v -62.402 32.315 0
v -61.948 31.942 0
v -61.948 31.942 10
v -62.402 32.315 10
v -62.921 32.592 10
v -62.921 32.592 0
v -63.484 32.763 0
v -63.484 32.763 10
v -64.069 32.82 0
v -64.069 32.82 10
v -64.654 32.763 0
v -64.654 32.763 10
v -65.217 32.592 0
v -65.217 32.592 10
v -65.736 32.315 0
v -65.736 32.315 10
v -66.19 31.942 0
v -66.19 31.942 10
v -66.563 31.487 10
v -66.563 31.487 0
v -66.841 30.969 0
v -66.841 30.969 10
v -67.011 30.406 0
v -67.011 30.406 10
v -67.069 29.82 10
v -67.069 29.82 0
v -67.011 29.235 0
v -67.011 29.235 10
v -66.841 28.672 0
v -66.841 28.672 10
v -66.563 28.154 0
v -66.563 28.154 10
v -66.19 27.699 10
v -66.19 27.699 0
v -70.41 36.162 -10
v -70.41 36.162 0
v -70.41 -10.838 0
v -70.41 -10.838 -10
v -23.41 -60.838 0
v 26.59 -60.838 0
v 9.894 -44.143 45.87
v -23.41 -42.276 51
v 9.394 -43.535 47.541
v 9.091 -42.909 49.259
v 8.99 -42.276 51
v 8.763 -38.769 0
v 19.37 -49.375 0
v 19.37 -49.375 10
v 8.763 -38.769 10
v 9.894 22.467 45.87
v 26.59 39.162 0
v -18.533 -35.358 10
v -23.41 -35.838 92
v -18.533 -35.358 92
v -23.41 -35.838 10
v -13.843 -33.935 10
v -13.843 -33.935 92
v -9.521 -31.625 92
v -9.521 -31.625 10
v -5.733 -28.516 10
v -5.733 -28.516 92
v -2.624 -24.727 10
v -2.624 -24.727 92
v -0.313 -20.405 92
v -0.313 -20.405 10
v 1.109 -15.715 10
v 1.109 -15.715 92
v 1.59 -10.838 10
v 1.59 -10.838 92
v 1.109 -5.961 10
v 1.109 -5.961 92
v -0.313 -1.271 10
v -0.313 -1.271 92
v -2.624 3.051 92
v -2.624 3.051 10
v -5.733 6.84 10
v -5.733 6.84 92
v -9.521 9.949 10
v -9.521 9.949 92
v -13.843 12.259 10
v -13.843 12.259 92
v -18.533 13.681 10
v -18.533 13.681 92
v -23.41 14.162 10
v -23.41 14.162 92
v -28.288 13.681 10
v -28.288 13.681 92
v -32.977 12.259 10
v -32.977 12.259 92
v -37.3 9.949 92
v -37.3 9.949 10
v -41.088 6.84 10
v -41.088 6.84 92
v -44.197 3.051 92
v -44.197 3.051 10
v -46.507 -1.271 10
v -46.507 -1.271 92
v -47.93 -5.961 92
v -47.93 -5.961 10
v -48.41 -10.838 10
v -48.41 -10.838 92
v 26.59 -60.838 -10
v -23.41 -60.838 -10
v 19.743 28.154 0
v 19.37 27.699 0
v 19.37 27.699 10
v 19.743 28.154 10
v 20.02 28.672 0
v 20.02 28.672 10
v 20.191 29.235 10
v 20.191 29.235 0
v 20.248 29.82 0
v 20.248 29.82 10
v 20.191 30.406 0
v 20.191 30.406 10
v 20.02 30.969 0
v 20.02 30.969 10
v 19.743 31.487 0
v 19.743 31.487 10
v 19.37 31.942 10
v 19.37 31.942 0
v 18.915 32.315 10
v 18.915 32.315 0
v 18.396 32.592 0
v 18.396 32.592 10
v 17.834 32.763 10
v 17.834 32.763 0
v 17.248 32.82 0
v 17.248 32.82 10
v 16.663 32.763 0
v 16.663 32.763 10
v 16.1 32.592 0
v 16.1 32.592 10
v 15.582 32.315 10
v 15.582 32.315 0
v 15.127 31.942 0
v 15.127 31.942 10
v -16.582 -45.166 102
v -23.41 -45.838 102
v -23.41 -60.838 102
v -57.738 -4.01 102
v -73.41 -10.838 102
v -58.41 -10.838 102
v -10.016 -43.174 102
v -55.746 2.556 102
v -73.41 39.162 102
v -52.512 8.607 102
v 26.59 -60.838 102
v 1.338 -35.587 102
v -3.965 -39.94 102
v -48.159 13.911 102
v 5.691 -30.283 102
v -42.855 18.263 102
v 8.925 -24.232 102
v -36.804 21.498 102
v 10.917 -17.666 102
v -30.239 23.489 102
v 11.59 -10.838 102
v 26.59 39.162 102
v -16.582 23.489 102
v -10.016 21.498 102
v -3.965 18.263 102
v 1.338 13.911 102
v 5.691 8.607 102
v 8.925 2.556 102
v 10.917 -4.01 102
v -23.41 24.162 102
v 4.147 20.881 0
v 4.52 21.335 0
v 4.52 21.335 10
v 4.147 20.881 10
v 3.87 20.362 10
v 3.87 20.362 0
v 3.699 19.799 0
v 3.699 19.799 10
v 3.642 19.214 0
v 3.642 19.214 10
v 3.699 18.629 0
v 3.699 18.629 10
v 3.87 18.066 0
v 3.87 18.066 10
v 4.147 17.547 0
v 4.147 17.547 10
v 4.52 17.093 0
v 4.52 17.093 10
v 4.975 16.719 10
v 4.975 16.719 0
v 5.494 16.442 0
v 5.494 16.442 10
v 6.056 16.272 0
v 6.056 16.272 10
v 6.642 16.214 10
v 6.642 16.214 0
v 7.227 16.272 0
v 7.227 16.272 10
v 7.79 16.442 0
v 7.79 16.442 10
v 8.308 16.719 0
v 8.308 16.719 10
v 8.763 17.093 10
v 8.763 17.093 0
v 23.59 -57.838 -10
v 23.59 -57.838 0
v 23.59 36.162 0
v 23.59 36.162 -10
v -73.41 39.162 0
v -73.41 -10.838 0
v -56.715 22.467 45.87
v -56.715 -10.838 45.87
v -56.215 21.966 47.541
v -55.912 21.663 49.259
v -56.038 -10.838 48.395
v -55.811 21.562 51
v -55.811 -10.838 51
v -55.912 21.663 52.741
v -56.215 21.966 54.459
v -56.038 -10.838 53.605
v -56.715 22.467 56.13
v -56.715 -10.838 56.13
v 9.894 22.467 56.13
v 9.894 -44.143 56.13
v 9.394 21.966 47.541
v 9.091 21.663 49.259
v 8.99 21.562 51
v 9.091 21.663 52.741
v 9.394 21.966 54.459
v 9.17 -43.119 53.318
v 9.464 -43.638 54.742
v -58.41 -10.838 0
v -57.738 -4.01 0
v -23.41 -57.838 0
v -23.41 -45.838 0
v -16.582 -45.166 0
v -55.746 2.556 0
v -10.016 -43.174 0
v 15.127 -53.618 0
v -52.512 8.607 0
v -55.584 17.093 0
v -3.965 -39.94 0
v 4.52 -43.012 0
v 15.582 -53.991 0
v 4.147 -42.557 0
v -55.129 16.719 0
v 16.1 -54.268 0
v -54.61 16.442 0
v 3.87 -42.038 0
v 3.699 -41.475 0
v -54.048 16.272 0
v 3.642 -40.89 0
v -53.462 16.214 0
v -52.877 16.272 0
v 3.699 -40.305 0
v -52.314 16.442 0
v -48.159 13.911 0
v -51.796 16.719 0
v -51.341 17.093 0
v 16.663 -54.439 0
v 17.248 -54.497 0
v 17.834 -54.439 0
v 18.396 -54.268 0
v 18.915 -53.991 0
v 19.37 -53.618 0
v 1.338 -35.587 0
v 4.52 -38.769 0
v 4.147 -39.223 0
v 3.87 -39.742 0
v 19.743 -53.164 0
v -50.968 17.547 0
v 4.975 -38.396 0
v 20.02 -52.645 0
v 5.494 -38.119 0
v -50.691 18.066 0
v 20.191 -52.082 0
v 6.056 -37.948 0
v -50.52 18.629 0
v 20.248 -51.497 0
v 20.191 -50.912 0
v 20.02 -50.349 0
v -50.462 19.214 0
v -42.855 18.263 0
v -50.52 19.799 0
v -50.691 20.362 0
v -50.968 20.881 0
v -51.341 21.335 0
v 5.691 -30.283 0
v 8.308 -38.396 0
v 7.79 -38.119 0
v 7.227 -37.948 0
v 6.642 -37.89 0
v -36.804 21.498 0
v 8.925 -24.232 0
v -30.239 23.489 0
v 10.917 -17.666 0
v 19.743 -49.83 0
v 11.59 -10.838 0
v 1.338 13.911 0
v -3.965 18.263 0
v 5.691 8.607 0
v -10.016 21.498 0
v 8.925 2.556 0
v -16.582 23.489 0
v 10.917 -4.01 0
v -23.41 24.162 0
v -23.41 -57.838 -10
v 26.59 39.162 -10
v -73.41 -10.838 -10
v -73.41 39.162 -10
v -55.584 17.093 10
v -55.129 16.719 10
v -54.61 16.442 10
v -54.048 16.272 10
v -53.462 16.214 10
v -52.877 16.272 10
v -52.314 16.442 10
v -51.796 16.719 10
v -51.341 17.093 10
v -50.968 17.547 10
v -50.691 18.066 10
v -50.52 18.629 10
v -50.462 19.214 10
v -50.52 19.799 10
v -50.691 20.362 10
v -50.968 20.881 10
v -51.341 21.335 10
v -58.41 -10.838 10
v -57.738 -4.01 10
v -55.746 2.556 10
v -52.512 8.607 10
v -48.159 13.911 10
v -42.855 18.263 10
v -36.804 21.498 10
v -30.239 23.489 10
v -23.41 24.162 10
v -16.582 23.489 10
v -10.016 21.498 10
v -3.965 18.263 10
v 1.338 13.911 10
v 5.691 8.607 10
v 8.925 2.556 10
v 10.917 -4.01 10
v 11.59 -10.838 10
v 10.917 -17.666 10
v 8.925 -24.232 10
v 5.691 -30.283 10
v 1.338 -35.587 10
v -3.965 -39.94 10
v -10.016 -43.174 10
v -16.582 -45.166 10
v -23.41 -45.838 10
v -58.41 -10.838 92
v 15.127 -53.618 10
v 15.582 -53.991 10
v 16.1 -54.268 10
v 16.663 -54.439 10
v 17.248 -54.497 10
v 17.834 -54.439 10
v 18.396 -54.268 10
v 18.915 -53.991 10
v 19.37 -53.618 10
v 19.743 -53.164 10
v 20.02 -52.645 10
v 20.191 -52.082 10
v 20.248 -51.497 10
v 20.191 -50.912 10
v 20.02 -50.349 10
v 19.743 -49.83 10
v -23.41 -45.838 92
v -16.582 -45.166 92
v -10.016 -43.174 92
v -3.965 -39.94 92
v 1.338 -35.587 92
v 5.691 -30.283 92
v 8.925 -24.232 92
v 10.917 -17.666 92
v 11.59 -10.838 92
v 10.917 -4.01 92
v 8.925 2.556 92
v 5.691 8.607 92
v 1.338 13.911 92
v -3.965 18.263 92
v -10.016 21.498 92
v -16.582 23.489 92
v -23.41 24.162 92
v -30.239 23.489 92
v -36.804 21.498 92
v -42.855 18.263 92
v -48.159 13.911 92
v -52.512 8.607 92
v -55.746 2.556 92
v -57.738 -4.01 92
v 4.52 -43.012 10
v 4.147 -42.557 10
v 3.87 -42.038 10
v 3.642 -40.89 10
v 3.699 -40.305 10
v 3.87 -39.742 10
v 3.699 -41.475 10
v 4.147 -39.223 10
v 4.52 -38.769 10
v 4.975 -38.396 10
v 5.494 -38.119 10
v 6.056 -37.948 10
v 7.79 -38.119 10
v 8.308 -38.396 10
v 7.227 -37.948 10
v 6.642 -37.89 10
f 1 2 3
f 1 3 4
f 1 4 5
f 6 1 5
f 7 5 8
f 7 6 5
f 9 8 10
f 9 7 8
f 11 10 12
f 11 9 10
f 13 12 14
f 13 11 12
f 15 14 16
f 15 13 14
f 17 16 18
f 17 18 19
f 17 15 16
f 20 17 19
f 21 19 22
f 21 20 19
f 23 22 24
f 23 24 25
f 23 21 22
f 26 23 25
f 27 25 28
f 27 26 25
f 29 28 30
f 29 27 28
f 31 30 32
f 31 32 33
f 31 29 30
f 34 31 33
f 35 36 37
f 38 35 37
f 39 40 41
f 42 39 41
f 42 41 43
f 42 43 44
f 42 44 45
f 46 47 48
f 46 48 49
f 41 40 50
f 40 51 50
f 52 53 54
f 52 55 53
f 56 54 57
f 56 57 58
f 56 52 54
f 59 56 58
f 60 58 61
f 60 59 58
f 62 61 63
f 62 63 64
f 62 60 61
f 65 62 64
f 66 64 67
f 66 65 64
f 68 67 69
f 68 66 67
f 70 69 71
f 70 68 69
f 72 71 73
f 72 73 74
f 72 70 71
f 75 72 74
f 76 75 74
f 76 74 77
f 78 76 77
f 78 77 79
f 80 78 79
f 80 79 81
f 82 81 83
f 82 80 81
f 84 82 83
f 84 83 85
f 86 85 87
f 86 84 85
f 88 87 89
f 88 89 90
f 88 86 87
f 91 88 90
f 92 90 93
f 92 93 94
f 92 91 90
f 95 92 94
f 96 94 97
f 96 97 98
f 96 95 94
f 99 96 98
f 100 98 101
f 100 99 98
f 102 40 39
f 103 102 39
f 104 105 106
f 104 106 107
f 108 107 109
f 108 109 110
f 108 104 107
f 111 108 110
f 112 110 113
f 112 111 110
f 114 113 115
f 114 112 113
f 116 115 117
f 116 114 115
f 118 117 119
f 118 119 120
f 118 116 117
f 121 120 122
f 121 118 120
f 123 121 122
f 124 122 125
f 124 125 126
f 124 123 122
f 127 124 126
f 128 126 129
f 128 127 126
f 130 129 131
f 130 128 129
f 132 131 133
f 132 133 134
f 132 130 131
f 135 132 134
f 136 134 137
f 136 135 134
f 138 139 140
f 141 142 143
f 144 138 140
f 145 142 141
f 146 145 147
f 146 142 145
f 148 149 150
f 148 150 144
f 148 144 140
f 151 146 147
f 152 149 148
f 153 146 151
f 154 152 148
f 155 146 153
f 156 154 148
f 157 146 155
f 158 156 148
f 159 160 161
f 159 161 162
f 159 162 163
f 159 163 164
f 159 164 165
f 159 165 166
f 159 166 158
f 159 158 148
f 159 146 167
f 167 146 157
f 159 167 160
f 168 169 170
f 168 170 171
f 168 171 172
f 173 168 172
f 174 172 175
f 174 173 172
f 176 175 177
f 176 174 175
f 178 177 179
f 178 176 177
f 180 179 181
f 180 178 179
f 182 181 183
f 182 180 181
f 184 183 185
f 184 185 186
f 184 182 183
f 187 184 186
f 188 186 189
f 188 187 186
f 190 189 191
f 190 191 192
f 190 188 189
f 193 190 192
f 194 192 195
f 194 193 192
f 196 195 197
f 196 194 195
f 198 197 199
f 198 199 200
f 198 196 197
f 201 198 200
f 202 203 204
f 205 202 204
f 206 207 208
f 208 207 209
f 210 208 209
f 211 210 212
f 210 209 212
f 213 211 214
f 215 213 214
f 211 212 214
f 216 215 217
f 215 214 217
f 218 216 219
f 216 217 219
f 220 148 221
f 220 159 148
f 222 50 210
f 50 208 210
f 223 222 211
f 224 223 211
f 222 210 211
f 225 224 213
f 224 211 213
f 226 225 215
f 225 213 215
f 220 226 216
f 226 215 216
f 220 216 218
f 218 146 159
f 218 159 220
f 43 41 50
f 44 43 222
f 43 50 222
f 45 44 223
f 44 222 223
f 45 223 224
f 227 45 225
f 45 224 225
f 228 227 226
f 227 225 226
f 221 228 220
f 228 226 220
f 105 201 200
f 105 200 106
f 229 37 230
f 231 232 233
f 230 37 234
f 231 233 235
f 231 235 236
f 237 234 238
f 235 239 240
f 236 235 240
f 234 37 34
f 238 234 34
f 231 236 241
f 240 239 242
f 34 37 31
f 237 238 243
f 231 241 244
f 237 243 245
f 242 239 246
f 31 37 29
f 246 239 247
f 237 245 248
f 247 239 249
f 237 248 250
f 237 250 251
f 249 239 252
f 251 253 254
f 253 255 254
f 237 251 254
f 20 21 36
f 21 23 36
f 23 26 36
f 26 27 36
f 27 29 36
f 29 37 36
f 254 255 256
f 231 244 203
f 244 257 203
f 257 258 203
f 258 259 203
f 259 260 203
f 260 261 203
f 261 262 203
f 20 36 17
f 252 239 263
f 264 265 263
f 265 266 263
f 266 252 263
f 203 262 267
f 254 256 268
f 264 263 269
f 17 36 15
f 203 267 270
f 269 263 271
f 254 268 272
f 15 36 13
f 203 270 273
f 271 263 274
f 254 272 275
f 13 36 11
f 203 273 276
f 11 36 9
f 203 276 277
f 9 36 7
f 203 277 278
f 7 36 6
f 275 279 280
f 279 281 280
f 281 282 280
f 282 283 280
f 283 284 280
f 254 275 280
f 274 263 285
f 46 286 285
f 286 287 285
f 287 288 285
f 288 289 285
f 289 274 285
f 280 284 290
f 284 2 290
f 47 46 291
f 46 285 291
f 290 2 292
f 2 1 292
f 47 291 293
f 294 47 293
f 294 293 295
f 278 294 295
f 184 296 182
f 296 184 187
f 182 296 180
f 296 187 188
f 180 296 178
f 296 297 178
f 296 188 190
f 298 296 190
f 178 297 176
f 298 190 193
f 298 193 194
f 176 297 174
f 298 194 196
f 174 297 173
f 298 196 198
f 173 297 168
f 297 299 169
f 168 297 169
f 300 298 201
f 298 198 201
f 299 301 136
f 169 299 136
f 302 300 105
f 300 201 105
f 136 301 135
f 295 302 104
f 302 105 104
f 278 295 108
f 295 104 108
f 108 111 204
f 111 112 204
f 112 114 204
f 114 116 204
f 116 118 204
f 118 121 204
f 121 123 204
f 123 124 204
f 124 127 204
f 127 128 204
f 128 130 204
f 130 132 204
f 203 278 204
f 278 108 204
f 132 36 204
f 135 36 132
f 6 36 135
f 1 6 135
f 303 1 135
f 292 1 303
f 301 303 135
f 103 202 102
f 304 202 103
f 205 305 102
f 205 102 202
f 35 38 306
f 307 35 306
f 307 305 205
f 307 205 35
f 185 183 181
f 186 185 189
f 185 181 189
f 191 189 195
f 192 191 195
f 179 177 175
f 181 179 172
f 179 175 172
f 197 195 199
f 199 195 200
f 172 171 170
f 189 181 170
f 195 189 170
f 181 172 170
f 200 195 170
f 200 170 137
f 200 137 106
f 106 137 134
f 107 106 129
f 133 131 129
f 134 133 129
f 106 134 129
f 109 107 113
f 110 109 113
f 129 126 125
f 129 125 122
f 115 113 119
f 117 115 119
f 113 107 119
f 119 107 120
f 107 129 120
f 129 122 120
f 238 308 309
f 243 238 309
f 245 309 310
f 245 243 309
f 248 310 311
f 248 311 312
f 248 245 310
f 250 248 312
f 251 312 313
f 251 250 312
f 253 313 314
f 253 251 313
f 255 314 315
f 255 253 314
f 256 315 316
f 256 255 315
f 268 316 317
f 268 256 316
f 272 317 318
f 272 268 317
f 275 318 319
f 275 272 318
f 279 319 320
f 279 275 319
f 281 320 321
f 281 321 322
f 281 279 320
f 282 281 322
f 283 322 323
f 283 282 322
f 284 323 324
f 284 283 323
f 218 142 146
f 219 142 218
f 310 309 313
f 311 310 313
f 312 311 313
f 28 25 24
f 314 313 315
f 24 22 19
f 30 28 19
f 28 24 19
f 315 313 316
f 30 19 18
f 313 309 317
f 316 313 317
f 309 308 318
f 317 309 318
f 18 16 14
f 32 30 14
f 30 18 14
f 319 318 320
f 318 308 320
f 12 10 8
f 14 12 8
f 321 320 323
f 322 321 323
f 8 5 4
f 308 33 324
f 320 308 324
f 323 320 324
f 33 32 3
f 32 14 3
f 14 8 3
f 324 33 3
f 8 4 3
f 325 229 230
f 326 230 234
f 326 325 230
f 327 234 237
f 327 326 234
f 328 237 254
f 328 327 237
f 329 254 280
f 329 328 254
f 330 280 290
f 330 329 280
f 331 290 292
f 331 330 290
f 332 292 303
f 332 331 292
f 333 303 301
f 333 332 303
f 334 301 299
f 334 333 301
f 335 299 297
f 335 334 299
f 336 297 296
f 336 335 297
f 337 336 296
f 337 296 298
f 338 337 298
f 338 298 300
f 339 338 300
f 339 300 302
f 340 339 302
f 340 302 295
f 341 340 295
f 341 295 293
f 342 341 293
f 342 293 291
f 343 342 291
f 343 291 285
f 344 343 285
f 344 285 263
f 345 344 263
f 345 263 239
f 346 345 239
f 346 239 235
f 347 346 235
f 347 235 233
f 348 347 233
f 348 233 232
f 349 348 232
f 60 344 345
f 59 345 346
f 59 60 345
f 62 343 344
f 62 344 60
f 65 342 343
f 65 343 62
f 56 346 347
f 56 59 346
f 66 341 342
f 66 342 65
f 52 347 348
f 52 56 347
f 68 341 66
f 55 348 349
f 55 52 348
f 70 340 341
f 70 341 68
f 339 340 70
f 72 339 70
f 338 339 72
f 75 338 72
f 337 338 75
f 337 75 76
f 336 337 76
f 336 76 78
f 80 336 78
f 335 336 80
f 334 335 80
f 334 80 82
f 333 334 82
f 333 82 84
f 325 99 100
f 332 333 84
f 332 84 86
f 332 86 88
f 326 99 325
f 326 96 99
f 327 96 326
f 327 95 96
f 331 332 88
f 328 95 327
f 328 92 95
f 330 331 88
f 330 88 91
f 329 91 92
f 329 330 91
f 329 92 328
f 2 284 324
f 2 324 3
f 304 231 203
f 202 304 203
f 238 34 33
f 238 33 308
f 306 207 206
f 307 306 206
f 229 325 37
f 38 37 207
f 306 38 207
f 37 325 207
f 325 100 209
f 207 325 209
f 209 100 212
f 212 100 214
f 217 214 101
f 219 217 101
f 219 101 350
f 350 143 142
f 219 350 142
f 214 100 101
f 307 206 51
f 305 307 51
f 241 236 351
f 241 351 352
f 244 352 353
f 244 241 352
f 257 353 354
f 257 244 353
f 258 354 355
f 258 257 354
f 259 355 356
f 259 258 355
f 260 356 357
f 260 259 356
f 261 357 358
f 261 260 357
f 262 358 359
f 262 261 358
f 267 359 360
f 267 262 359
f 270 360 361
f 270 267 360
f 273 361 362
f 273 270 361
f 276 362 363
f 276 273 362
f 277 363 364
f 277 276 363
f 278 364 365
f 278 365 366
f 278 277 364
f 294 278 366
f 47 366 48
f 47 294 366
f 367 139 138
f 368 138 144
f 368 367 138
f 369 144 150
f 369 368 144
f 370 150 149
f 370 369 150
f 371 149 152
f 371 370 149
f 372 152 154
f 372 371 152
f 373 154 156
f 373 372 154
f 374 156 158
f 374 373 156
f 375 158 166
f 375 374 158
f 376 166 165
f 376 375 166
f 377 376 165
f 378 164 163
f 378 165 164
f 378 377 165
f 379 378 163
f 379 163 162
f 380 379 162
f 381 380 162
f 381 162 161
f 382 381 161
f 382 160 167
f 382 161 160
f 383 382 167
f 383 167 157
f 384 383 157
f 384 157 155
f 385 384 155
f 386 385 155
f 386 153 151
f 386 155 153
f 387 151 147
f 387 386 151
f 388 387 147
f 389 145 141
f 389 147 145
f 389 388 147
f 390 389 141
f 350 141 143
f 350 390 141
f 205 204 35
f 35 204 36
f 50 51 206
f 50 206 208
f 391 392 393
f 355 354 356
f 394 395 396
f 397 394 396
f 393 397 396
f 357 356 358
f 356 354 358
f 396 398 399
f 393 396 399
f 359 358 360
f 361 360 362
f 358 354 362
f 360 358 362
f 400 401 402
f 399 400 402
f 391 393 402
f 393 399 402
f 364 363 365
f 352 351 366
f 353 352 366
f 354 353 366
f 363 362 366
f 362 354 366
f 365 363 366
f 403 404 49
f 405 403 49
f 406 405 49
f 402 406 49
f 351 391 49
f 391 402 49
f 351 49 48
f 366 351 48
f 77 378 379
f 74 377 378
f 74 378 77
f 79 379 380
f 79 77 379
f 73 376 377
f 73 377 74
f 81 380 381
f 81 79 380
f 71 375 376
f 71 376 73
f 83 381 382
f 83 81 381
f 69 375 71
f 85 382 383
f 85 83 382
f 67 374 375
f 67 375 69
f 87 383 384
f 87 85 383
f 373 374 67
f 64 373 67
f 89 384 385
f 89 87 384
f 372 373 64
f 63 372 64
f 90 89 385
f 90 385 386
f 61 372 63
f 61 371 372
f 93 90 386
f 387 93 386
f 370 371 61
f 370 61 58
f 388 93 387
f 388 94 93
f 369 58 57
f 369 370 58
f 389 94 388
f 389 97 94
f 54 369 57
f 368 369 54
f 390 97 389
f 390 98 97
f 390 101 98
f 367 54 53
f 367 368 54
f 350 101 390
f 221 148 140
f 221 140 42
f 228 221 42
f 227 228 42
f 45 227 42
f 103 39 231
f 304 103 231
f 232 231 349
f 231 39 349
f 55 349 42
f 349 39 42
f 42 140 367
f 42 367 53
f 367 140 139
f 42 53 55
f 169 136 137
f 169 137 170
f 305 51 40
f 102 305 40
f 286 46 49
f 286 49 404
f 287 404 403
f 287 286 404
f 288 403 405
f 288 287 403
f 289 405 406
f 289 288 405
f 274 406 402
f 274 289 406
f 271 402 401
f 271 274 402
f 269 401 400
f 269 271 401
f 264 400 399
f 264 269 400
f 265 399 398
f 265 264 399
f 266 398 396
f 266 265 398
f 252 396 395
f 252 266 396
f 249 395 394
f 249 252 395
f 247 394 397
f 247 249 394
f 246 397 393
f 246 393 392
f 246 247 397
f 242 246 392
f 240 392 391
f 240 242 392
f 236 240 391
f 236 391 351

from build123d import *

# Parameters (mm, degrees)
ESQUISSE2_W                  = 100
ESQUISSE2_H                  = 100
BOSS_EXTRU_1_DEPTH           = 51
BOSS_EXTRU_1_TAPER           = 20
ENL_V_MAT_EXTRU_1_DEPTH      = 140.622233322
ENL_V_MAT_EXTRU_1_DEPTH_BACK = 140.622233322
ESQUISSE3_R                  = 25
ENL_V_MAT_EXTRU_2_DEPTH      = 140.622233322
ENL_V_MAT_EXTRU_2_DEPTH_BACK = 10
ESQUISSE5_R                  = 35
ENL_V_START                  = -10
ESQUISSE6_R                  = 35
ENL_V_MAT_EXTRU_3_DEPTH      = 10
ESQUISSE7_W                  = 50
ESQUISSE7_H                  = 50
ENL_V_MAT_EXTRU_4_DEPTH      = 140.622233322
CONG_1_R                     = 15
ENL_V_MAT_EXTRU_8_DEPTH      = 10
BOSS_EXTRU_2_DEPTH           = 10


with BuildPart() as part:
    # Esquisse2 → Boss.-Extru.1 (new body)
    with BuildSketch(Plane.XY):
        with Locations((-23.410404624, -10.838150289)):
            Rectangle(ESQUISSE2_W, ESQUISSE2_H)
    boss_extru_1 = extrude(amount=BOSS_EXTRU_1_DEPTH, taper=BOSS_EXTRU_1_TAPER)

    # Symétrie4: Boss.-Extru.1 across plane
    add(boss_extru_1.mirror(Plane.XY.offset(51)))

    # Esquisse3 → Enlèv. mat.-Extru.1 (cut, two sides: drawn at the far end of the back side and taken through both)
    with BuildSketch(Plane.XY.offset(102).offset(-ENL_V_MAT_EXTRU_1_DEPTH_BACK)):
        with Locations((-23.410404624, -10.838150289)):
            Circle(ESQUISSE3_R)
    extrude(amount=ENL_V_MAT_EXTRU_1_DEPTH + ENL_V_MAT_EXTRU_1_DEPTH_BACK, mode=Mode.SUBTRACT)

    # Esquisse5 → Enlèv. mat.-Extru.2 (cut, two sides: drawn at the far end of the back side and taken through both)
    with BuildSketch(Plane.XY.offset(102).offset(-ENL_V_MAT_EXTRU_2_DEPTH_BACK)):
        with Locations(Location((-23.410404624, -10.838150289, 0), (0, 0, 180))):
            Circle(ESQUISSE5_R)
    extrude(amount=ENL_V_MAT_EXTRU_2_DEPTH + ENL_V_MAT_EXTRU_2_DEPTH_BACK, mode=Mode.SUBTRACT)

    # Esquisse6 → Enlèv. mat.-Extru.3 (cut)
    with BuildSketch(Plane(origin=(0, 0, 0), x_dir=(-1, 0, 0), z_dir=(0, 0, -1)).offset(ENL_V_START)):
        with Locations((23.410404624, -10.838150289)):
            Circle(ESQUISSE6_R)
    extrude(amount=ENL_V_MAT_EXTRU_3_DEPTH, mode=Mode.SUBTRACT)

    # Esquisse7 → Enlèv. mat.-Extru.4 (cut, through all)
    with BuildSketch(Plane(origin=(0, 0, 0), x_dir=(-1, 0, 0), z_dir=(0, 0, -1))):
        with Locations((48.410404624, -35.838150289)):
            Rectangle(ESQUISSE7_W, ESQUISSE7_H)
    extrude(amount=-ENL_V_MAT_EXTRU_4_DEPTH, mode=Mode.SUBTRACT)

    # Congé1
    cong_1_edges = [part.edges().sort_by_distance(p)[0] for p in [
        (8.027113428, -10.838150289, 51),
        (-23.410404624, 20.599367763, 51),
        (-54.847922677, 4.880608737, 51),
    ]]
    fillet(cong_1_edges, radius=CONG_1_R)

    # Esquisse8 → Enlèv. mat.-Extru.8 (cut)
    with BuildSketch(Plane(origin=(0, 0, 0), x_dir=(-1, 0, 0), z_dir=(0, 0, -1))):
        with BuildLine():
            Line((-15.12691495, 31.941809973), (-4.520313233, 21.335208255))
            ThreePointArc((-4.520313233, 21.335208255), (-4.520313233, 17.092567568), (-8.76295392, 17.092567568))
            Line((-8.76295392, 17.092567568), (-19.369555638, 27.699169286))
            ThreePointArc((-19.369555638, 27.699169286), (-19.369555638, 31.941809973), (-15.12691495, 31.941809973))
        make_face()
        with BuildLine():
            Line((-19.369555638, -49.375469864), (-8.76295392, -38.768868146))
            ThreePointArc((-8.76295392, -38.768868146), (-4.520313233, -38.768868146), (-4.520313233, -43.011508833))
            Line((-4.520313233, -43.011508833), (-15.12691495, -53.618110551))
            ThreePointArc((-15.12691495, -53.618110551), (-19.369555638, -53.618110551), (-19.369555638, -49.375469864))
        make_face()
        with BuildLine():
            Line((51.341122481, 21.335208255), (61.947724199, 31.941809973))
            ThreePointArc((61.947724199, 31.941809973), (66.190364886, 31.941809973), (66.190364886, 27.699169286))
            Line((66.190364886, 27.699169286), (55.583763168, 17.092567568))
            ThreePointArc((55.583763168, 17.092567568), (51.341122481, 17.092567568), (51.341122481, 21.335208255))
        make_face()
    extrude(amount=-ENL_V_MAT_EXTRU_8_DEPTH, mode=Mode.SUBTRACT)

    # Esquisse9 → Boss.-Extru.2 (add)
    with BuildSketch(Plane(origin=(0, 0, 0), x_dir=(-1, 0, 0), z_dir=(0, 0, -1))):
        Polygon((-26.589595376, -60.838150289), (23.410404624, -60.838150289), (23.410404624, -57.838150289), (-23.589595376, -57.838150289), (-23.589595376, 36.161849711), (70.410404624, 36.161849711), (70.410404624, -10.838150289), (73.410404624, -10.838150289), (73.410404624, 39.161849711), (-26.589595376, 39.161849711), align=None)
    extrude(amount=BOSS_EXTRU_2_DEPTH)


solid = part.part
